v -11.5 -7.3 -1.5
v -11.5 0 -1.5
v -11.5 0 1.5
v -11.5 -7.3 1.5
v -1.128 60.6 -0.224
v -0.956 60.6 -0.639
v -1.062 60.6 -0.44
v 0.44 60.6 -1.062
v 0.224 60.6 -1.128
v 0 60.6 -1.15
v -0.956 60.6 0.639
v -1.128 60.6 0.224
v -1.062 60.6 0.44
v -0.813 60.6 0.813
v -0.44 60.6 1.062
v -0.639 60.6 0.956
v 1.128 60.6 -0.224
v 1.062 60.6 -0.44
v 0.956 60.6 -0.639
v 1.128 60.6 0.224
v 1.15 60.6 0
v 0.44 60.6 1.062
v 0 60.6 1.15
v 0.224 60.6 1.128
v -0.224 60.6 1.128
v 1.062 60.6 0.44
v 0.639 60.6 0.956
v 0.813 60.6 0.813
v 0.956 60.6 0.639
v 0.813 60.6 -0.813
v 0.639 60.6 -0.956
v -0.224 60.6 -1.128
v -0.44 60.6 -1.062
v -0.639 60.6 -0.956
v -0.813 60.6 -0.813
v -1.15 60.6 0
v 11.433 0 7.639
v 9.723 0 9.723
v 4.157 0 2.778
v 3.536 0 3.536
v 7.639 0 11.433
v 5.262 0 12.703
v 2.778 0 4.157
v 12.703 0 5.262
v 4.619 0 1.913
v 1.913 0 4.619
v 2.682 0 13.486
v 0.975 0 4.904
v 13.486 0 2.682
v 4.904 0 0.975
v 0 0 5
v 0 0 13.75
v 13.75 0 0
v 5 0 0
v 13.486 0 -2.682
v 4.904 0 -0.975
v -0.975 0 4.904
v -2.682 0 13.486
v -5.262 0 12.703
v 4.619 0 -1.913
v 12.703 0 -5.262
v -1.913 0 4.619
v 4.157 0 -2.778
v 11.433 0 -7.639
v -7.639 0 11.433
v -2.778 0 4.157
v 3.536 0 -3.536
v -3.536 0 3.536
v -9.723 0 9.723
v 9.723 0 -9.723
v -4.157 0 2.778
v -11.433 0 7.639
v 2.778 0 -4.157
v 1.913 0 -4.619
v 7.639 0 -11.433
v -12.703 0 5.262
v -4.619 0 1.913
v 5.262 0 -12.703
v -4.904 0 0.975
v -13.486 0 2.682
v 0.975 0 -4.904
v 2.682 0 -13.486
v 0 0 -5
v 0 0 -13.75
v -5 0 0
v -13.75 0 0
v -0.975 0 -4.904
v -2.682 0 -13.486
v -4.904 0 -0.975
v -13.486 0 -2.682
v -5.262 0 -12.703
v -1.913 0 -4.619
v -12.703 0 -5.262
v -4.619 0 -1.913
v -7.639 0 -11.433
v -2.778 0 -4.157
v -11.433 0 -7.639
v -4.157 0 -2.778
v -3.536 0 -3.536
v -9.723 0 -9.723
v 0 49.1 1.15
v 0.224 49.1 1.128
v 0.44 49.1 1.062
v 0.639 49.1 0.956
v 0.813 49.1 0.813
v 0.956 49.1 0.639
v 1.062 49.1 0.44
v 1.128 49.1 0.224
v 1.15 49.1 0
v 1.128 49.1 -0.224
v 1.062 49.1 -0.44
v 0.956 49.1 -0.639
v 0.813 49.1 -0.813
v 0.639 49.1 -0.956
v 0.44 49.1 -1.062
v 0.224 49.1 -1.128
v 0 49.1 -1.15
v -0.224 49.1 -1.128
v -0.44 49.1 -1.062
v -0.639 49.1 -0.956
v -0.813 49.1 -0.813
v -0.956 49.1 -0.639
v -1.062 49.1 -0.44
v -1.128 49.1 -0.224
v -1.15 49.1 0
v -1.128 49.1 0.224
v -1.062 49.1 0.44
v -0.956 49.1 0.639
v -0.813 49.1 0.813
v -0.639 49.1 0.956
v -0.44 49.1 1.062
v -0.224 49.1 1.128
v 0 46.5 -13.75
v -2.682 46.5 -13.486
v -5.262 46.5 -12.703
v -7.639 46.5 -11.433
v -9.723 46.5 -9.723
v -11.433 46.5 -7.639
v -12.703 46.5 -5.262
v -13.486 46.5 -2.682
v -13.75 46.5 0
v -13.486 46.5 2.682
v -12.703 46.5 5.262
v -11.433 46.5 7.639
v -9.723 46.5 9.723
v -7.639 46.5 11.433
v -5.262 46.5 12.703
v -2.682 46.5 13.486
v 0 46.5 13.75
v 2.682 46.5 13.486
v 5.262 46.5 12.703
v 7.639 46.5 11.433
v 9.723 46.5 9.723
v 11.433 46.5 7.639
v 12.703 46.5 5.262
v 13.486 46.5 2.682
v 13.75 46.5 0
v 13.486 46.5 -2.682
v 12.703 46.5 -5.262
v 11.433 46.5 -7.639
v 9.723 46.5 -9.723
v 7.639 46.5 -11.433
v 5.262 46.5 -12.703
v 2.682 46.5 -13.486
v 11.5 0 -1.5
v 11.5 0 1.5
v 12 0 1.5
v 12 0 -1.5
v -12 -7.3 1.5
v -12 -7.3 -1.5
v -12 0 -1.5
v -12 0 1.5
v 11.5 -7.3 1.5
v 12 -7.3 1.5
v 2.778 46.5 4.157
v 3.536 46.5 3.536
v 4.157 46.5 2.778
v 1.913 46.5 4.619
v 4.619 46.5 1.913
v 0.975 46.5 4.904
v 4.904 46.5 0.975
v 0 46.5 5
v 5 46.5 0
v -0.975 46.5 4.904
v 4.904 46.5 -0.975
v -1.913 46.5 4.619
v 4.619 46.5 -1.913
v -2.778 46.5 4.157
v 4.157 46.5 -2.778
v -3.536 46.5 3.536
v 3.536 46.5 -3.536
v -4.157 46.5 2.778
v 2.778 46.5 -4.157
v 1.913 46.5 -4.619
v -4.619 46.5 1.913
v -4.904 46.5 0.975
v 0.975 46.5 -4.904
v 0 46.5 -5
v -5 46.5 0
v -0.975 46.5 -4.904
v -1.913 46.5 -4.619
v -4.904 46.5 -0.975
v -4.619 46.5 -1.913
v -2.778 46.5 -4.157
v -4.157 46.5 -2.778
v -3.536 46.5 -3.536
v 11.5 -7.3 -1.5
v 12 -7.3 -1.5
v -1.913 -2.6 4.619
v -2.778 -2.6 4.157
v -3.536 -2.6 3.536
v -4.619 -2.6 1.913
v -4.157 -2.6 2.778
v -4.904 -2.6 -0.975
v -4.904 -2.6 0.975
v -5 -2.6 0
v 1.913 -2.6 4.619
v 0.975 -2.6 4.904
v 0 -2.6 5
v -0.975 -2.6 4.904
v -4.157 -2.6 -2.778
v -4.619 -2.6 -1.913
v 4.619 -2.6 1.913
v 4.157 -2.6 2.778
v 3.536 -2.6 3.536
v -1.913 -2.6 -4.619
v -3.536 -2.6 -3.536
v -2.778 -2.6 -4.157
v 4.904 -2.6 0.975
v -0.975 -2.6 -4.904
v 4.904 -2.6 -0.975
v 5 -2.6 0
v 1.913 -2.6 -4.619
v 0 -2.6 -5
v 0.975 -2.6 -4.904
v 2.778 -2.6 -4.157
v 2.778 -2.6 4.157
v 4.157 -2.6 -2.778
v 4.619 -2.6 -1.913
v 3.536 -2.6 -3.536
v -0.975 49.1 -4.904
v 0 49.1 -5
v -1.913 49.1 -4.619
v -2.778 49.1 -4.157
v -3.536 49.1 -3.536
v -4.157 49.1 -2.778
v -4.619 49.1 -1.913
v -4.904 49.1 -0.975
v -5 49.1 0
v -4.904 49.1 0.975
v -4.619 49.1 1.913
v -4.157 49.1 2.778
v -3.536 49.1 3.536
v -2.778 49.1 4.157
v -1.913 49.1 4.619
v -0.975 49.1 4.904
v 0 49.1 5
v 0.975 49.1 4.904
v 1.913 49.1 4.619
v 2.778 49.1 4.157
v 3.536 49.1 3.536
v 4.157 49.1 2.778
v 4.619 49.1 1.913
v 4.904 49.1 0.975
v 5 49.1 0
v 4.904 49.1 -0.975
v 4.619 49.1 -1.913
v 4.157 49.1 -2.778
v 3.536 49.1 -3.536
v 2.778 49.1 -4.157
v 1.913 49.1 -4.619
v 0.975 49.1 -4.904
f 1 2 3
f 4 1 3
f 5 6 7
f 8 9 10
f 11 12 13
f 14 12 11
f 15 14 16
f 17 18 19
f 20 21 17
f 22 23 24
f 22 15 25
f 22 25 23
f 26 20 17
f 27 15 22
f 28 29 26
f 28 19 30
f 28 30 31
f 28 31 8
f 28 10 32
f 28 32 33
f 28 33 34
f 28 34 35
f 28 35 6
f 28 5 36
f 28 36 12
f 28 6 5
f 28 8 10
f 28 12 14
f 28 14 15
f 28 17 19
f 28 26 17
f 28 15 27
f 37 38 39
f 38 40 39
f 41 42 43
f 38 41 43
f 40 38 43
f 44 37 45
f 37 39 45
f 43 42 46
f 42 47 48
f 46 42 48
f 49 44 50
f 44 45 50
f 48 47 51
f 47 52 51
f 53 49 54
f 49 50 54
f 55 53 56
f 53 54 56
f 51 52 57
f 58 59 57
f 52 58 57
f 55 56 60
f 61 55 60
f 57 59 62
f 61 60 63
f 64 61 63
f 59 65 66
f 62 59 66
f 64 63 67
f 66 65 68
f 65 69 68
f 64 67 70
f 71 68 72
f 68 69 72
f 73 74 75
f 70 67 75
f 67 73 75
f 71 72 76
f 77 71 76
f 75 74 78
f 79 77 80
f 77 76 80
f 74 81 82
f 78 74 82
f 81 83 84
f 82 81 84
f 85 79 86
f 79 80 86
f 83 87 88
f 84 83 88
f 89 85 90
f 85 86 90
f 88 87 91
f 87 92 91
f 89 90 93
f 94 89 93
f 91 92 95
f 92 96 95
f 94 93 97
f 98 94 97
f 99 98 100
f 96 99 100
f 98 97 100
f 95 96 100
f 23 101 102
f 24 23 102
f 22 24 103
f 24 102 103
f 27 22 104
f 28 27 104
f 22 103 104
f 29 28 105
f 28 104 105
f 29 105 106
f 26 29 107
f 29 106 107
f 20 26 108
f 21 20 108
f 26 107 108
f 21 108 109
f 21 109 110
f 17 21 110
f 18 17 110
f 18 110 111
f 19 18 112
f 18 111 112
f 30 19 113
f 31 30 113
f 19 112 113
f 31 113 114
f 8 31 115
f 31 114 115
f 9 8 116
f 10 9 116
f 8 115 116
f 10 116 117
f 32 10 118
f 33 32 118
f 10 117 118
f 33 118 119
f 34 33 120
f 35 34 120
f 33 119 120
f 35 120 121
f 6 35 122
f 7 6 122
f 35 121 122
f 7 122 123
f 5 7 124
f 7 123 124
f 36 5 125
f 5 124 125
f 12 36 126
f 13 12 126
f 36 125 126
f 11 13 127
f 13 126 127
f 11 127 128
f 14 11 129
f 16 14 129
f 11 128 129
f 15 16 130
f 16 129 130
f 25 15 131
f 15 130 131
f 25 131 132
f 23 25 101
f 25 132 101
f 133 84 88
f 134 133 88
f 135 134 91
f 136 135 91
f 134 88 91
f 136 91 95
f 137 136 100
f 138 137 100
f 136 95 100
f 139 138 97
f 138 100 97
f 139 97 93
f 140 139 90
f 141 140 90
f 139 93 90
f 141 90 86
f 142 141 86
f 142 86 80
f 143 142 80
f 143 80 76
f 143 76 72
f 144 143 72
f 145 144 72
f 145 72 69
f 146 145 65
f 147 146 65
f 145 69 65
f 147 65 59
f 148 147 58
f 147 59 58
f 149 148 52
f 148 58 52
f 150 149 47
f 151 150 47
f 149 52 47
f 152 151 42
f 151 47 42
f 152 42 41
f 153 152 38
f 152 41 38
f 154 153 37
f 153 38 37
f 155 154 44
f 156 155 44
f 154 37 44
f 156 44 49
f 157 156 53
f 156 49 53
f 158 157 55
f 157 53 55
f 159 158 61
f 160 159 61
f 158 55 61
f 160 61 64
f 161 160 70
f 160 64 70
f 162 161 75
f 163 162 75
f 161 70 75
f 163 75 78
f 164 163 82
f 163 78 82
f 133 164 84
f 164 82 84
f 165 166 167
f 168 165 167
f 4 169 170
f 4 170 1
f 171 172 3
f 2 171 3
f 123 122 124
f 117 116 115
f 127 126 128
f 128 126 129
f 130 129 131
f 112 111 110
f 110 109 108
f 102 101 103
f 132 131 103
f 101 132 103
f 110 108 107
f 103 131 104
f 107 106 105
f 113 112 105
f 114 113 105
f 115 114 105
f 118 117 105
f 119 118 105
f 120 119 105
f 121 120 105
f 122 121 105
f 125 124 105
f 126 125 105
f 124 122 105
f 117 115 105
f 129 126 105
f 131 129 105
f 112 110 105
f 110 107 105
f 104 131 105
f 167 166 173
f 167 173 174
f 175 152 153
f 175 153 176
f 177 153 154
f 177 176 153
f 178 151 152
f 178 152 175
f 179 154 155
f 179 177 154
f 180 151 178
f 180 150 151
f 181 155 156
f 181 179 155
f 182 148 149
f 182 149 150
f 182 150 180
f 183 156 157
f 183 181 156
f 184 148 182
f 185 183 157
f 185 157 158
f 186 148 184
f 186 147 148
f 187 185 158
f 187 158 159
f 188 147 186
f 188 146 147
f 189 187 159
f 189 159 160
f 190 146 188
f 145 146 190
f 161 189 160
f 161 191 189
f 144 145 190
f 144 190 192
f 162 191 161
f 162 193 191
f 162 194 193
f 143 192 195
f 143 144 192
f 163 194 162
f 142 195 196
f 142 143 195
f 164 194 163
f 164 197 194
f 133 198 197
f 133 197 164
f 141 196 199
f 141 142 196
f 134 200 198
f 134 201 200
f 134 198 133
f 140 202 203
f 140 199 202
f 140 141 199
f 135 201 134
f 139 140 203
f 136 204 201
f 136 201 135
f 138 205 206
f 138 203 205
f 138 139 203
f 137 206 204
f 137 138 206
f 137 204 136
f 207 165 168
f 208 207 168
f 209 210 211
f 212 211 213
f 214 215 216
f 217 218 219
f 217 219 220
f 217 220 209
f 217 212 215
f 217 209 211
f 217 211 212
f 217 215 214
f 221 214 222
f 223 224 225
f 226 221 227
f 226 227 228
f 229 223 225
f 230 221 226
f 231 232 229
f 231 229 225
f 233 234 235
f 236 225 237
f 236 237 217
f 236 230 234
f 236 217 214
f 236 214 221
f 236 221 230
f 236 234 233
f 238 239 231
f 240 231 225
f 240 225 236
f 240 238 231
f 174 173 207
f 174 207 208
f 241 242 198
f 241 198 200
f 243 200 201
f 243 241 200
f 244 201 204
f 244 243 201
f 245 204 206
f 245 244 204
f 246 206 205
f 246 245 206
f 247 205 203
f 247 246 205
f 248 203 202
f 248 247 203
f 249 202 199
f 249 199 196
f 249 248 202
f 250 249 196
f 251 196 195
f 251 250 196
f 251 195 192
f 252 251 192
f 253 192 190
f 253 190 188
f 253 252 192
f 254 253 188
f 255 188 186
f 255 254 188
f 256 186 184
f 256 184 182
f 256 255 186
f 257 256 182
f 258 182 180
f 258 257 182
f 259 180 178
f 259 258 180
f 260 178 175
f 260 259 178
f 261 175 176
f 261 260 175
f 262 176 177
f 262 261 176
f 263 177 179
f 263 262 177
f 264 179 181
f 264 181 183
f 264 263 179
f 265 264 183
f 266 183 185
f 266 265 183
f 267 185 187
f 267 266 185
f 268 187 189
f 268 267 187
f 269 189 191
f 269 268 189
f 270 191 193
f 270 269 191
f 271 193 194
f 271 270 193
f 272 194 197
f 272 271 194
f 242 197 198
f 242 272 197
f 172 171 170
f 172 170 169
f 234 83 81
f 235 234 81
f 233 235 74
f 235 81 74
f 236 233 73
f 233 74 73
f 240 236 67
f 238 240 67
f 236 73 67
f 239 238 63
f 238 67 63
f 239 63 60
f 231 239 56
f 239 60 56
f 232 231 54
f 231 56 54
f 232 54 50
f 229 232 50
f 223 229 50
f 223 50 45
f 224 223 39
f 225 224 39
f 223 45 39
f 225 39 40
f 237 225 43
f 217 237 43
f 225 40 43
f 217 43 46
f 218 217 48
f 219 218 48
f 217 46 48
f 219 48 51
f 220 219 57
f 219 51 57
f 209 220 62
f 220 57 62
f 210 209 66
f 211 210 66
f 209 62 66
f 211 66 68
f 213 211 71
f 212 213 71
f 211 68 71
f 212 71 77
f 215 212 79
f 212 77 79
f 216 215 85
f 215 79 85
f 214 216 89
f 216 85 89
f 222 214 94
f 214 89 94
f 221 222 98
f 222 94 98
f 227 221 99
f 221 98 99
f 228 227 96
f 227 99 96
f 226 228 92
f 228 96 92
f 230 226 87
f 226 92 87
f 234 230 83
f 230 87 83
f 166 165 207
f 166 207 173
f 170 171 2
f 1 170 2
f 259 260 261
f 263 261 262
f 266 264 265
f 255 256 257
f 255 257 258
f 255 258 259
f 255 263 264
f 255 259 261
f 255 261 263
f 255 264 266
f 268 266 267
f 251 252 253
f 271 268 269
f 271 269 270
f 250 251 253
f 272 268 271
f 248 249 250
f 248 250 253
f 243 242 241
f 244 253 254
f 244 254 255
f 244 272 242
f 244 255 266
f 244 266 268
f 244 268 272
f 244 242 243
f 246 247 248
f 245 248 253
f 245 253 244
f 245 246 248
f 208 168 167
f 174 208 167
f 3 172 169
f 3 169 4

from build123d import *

# Parameters (mm, degrees)
SKETCH1_R             = 13.75
BOSS_EXTRUDE1_DEPTH   = 46.5
SKETCH2_R             = 5
BOSS_EXTRUDE2_DEPTH   = 2.6
SKETCH3_W             = 0.5
SKETCH3_H             = 3
BOSS_EXTRUDE3_DEPTH   = 7.3
BOSS_EXTRUDE3_2_DEPTH = 7.3
BOSS_EXTRUDE4_START   = 2.6
SKETCH4_R             = 5
BOSS_EXTRUDE4_DEPTH   = 2.6
SKETCH5_R             = 1.15
BOSS_EXTRUDE5_DEPTH   = 11.5


with BuildPart() as part:
    # Sketch1 → Boss-Extrude1 (new body)
    with BuildSketch(Plane(origin=(0, 0, 0), x_dir=(1, 0, 0), z_dir=(0, 1, 0))):
        with Locations(Location((0, 0, 0), (0, 0, 90))):
            Circle(SKETCH1_R)
    extrude(amount=BOSS_EXTRUDE1_DEPTH)

    # Sketch2 → Boss-Extrude2 (add)
    with BuildSketch(Plane.XZ):
        with Locations(Location((0, 0, 0), (0, 0, 270))):
            Circle(SKETCH2_R)
    extrude(amount=BOSS_EXTRUDE2_DEPTH)

    # Sketch4 → Boss-Extrude4 (add)
    with BuildSketch(Plane(origin=(0, 46.5, 0), x_dir=(1, 0, 0), z_dir=(0, 1, 0)).offset(BOSS_EXTRUDE4_START)):
        with Locations(Location((0, 0, 0), (0, 0, 90))):
            Circle(SKETCH4_R)
    extrude(amount=-BOSS_EXTRUDE4_DEPTH)


with BuildPart() as body_2:
    # Sketch3 → Boss-Extrude3 (new body)
    with BuildSketch(Plane.XZ):
        with Locations((-11.75, 0)):
            Rectangle(SKETCH3_W, SKETCH3_H)
    extrude(amount=BOSS_EXTRUDE3_DEPTH)


with BuildPart() as body_3:
    # Sketch3 → Boss-Extrude3 2 (new body)
    with BuildSketch(Plane.XZ):
        with Locations((11.75, 0)):
            Rectangle(SKETCH3_W, SKETCH3_H)
    extrude(amount=BOSS_EXTRUDE3_2_DEPTH)


with BuildPart() as body_4:
    # Sketch5 → Boss-Extrude5 (new body)
    with BuildSketch(Plane(origin=(0, 49.1, 0), x_dir=(1, 0, 0), z_dir=(0, 1, 0))):
        with Locations(Location((0, 0, 0), (0, 0, 270))):
            Circle(SKETCH5_R)
    extrude(amount=BOSS_EXTRUDE5_DEPTH)


solid = Compound([part.part, body_2.part, body_3.part, body_4.part])
